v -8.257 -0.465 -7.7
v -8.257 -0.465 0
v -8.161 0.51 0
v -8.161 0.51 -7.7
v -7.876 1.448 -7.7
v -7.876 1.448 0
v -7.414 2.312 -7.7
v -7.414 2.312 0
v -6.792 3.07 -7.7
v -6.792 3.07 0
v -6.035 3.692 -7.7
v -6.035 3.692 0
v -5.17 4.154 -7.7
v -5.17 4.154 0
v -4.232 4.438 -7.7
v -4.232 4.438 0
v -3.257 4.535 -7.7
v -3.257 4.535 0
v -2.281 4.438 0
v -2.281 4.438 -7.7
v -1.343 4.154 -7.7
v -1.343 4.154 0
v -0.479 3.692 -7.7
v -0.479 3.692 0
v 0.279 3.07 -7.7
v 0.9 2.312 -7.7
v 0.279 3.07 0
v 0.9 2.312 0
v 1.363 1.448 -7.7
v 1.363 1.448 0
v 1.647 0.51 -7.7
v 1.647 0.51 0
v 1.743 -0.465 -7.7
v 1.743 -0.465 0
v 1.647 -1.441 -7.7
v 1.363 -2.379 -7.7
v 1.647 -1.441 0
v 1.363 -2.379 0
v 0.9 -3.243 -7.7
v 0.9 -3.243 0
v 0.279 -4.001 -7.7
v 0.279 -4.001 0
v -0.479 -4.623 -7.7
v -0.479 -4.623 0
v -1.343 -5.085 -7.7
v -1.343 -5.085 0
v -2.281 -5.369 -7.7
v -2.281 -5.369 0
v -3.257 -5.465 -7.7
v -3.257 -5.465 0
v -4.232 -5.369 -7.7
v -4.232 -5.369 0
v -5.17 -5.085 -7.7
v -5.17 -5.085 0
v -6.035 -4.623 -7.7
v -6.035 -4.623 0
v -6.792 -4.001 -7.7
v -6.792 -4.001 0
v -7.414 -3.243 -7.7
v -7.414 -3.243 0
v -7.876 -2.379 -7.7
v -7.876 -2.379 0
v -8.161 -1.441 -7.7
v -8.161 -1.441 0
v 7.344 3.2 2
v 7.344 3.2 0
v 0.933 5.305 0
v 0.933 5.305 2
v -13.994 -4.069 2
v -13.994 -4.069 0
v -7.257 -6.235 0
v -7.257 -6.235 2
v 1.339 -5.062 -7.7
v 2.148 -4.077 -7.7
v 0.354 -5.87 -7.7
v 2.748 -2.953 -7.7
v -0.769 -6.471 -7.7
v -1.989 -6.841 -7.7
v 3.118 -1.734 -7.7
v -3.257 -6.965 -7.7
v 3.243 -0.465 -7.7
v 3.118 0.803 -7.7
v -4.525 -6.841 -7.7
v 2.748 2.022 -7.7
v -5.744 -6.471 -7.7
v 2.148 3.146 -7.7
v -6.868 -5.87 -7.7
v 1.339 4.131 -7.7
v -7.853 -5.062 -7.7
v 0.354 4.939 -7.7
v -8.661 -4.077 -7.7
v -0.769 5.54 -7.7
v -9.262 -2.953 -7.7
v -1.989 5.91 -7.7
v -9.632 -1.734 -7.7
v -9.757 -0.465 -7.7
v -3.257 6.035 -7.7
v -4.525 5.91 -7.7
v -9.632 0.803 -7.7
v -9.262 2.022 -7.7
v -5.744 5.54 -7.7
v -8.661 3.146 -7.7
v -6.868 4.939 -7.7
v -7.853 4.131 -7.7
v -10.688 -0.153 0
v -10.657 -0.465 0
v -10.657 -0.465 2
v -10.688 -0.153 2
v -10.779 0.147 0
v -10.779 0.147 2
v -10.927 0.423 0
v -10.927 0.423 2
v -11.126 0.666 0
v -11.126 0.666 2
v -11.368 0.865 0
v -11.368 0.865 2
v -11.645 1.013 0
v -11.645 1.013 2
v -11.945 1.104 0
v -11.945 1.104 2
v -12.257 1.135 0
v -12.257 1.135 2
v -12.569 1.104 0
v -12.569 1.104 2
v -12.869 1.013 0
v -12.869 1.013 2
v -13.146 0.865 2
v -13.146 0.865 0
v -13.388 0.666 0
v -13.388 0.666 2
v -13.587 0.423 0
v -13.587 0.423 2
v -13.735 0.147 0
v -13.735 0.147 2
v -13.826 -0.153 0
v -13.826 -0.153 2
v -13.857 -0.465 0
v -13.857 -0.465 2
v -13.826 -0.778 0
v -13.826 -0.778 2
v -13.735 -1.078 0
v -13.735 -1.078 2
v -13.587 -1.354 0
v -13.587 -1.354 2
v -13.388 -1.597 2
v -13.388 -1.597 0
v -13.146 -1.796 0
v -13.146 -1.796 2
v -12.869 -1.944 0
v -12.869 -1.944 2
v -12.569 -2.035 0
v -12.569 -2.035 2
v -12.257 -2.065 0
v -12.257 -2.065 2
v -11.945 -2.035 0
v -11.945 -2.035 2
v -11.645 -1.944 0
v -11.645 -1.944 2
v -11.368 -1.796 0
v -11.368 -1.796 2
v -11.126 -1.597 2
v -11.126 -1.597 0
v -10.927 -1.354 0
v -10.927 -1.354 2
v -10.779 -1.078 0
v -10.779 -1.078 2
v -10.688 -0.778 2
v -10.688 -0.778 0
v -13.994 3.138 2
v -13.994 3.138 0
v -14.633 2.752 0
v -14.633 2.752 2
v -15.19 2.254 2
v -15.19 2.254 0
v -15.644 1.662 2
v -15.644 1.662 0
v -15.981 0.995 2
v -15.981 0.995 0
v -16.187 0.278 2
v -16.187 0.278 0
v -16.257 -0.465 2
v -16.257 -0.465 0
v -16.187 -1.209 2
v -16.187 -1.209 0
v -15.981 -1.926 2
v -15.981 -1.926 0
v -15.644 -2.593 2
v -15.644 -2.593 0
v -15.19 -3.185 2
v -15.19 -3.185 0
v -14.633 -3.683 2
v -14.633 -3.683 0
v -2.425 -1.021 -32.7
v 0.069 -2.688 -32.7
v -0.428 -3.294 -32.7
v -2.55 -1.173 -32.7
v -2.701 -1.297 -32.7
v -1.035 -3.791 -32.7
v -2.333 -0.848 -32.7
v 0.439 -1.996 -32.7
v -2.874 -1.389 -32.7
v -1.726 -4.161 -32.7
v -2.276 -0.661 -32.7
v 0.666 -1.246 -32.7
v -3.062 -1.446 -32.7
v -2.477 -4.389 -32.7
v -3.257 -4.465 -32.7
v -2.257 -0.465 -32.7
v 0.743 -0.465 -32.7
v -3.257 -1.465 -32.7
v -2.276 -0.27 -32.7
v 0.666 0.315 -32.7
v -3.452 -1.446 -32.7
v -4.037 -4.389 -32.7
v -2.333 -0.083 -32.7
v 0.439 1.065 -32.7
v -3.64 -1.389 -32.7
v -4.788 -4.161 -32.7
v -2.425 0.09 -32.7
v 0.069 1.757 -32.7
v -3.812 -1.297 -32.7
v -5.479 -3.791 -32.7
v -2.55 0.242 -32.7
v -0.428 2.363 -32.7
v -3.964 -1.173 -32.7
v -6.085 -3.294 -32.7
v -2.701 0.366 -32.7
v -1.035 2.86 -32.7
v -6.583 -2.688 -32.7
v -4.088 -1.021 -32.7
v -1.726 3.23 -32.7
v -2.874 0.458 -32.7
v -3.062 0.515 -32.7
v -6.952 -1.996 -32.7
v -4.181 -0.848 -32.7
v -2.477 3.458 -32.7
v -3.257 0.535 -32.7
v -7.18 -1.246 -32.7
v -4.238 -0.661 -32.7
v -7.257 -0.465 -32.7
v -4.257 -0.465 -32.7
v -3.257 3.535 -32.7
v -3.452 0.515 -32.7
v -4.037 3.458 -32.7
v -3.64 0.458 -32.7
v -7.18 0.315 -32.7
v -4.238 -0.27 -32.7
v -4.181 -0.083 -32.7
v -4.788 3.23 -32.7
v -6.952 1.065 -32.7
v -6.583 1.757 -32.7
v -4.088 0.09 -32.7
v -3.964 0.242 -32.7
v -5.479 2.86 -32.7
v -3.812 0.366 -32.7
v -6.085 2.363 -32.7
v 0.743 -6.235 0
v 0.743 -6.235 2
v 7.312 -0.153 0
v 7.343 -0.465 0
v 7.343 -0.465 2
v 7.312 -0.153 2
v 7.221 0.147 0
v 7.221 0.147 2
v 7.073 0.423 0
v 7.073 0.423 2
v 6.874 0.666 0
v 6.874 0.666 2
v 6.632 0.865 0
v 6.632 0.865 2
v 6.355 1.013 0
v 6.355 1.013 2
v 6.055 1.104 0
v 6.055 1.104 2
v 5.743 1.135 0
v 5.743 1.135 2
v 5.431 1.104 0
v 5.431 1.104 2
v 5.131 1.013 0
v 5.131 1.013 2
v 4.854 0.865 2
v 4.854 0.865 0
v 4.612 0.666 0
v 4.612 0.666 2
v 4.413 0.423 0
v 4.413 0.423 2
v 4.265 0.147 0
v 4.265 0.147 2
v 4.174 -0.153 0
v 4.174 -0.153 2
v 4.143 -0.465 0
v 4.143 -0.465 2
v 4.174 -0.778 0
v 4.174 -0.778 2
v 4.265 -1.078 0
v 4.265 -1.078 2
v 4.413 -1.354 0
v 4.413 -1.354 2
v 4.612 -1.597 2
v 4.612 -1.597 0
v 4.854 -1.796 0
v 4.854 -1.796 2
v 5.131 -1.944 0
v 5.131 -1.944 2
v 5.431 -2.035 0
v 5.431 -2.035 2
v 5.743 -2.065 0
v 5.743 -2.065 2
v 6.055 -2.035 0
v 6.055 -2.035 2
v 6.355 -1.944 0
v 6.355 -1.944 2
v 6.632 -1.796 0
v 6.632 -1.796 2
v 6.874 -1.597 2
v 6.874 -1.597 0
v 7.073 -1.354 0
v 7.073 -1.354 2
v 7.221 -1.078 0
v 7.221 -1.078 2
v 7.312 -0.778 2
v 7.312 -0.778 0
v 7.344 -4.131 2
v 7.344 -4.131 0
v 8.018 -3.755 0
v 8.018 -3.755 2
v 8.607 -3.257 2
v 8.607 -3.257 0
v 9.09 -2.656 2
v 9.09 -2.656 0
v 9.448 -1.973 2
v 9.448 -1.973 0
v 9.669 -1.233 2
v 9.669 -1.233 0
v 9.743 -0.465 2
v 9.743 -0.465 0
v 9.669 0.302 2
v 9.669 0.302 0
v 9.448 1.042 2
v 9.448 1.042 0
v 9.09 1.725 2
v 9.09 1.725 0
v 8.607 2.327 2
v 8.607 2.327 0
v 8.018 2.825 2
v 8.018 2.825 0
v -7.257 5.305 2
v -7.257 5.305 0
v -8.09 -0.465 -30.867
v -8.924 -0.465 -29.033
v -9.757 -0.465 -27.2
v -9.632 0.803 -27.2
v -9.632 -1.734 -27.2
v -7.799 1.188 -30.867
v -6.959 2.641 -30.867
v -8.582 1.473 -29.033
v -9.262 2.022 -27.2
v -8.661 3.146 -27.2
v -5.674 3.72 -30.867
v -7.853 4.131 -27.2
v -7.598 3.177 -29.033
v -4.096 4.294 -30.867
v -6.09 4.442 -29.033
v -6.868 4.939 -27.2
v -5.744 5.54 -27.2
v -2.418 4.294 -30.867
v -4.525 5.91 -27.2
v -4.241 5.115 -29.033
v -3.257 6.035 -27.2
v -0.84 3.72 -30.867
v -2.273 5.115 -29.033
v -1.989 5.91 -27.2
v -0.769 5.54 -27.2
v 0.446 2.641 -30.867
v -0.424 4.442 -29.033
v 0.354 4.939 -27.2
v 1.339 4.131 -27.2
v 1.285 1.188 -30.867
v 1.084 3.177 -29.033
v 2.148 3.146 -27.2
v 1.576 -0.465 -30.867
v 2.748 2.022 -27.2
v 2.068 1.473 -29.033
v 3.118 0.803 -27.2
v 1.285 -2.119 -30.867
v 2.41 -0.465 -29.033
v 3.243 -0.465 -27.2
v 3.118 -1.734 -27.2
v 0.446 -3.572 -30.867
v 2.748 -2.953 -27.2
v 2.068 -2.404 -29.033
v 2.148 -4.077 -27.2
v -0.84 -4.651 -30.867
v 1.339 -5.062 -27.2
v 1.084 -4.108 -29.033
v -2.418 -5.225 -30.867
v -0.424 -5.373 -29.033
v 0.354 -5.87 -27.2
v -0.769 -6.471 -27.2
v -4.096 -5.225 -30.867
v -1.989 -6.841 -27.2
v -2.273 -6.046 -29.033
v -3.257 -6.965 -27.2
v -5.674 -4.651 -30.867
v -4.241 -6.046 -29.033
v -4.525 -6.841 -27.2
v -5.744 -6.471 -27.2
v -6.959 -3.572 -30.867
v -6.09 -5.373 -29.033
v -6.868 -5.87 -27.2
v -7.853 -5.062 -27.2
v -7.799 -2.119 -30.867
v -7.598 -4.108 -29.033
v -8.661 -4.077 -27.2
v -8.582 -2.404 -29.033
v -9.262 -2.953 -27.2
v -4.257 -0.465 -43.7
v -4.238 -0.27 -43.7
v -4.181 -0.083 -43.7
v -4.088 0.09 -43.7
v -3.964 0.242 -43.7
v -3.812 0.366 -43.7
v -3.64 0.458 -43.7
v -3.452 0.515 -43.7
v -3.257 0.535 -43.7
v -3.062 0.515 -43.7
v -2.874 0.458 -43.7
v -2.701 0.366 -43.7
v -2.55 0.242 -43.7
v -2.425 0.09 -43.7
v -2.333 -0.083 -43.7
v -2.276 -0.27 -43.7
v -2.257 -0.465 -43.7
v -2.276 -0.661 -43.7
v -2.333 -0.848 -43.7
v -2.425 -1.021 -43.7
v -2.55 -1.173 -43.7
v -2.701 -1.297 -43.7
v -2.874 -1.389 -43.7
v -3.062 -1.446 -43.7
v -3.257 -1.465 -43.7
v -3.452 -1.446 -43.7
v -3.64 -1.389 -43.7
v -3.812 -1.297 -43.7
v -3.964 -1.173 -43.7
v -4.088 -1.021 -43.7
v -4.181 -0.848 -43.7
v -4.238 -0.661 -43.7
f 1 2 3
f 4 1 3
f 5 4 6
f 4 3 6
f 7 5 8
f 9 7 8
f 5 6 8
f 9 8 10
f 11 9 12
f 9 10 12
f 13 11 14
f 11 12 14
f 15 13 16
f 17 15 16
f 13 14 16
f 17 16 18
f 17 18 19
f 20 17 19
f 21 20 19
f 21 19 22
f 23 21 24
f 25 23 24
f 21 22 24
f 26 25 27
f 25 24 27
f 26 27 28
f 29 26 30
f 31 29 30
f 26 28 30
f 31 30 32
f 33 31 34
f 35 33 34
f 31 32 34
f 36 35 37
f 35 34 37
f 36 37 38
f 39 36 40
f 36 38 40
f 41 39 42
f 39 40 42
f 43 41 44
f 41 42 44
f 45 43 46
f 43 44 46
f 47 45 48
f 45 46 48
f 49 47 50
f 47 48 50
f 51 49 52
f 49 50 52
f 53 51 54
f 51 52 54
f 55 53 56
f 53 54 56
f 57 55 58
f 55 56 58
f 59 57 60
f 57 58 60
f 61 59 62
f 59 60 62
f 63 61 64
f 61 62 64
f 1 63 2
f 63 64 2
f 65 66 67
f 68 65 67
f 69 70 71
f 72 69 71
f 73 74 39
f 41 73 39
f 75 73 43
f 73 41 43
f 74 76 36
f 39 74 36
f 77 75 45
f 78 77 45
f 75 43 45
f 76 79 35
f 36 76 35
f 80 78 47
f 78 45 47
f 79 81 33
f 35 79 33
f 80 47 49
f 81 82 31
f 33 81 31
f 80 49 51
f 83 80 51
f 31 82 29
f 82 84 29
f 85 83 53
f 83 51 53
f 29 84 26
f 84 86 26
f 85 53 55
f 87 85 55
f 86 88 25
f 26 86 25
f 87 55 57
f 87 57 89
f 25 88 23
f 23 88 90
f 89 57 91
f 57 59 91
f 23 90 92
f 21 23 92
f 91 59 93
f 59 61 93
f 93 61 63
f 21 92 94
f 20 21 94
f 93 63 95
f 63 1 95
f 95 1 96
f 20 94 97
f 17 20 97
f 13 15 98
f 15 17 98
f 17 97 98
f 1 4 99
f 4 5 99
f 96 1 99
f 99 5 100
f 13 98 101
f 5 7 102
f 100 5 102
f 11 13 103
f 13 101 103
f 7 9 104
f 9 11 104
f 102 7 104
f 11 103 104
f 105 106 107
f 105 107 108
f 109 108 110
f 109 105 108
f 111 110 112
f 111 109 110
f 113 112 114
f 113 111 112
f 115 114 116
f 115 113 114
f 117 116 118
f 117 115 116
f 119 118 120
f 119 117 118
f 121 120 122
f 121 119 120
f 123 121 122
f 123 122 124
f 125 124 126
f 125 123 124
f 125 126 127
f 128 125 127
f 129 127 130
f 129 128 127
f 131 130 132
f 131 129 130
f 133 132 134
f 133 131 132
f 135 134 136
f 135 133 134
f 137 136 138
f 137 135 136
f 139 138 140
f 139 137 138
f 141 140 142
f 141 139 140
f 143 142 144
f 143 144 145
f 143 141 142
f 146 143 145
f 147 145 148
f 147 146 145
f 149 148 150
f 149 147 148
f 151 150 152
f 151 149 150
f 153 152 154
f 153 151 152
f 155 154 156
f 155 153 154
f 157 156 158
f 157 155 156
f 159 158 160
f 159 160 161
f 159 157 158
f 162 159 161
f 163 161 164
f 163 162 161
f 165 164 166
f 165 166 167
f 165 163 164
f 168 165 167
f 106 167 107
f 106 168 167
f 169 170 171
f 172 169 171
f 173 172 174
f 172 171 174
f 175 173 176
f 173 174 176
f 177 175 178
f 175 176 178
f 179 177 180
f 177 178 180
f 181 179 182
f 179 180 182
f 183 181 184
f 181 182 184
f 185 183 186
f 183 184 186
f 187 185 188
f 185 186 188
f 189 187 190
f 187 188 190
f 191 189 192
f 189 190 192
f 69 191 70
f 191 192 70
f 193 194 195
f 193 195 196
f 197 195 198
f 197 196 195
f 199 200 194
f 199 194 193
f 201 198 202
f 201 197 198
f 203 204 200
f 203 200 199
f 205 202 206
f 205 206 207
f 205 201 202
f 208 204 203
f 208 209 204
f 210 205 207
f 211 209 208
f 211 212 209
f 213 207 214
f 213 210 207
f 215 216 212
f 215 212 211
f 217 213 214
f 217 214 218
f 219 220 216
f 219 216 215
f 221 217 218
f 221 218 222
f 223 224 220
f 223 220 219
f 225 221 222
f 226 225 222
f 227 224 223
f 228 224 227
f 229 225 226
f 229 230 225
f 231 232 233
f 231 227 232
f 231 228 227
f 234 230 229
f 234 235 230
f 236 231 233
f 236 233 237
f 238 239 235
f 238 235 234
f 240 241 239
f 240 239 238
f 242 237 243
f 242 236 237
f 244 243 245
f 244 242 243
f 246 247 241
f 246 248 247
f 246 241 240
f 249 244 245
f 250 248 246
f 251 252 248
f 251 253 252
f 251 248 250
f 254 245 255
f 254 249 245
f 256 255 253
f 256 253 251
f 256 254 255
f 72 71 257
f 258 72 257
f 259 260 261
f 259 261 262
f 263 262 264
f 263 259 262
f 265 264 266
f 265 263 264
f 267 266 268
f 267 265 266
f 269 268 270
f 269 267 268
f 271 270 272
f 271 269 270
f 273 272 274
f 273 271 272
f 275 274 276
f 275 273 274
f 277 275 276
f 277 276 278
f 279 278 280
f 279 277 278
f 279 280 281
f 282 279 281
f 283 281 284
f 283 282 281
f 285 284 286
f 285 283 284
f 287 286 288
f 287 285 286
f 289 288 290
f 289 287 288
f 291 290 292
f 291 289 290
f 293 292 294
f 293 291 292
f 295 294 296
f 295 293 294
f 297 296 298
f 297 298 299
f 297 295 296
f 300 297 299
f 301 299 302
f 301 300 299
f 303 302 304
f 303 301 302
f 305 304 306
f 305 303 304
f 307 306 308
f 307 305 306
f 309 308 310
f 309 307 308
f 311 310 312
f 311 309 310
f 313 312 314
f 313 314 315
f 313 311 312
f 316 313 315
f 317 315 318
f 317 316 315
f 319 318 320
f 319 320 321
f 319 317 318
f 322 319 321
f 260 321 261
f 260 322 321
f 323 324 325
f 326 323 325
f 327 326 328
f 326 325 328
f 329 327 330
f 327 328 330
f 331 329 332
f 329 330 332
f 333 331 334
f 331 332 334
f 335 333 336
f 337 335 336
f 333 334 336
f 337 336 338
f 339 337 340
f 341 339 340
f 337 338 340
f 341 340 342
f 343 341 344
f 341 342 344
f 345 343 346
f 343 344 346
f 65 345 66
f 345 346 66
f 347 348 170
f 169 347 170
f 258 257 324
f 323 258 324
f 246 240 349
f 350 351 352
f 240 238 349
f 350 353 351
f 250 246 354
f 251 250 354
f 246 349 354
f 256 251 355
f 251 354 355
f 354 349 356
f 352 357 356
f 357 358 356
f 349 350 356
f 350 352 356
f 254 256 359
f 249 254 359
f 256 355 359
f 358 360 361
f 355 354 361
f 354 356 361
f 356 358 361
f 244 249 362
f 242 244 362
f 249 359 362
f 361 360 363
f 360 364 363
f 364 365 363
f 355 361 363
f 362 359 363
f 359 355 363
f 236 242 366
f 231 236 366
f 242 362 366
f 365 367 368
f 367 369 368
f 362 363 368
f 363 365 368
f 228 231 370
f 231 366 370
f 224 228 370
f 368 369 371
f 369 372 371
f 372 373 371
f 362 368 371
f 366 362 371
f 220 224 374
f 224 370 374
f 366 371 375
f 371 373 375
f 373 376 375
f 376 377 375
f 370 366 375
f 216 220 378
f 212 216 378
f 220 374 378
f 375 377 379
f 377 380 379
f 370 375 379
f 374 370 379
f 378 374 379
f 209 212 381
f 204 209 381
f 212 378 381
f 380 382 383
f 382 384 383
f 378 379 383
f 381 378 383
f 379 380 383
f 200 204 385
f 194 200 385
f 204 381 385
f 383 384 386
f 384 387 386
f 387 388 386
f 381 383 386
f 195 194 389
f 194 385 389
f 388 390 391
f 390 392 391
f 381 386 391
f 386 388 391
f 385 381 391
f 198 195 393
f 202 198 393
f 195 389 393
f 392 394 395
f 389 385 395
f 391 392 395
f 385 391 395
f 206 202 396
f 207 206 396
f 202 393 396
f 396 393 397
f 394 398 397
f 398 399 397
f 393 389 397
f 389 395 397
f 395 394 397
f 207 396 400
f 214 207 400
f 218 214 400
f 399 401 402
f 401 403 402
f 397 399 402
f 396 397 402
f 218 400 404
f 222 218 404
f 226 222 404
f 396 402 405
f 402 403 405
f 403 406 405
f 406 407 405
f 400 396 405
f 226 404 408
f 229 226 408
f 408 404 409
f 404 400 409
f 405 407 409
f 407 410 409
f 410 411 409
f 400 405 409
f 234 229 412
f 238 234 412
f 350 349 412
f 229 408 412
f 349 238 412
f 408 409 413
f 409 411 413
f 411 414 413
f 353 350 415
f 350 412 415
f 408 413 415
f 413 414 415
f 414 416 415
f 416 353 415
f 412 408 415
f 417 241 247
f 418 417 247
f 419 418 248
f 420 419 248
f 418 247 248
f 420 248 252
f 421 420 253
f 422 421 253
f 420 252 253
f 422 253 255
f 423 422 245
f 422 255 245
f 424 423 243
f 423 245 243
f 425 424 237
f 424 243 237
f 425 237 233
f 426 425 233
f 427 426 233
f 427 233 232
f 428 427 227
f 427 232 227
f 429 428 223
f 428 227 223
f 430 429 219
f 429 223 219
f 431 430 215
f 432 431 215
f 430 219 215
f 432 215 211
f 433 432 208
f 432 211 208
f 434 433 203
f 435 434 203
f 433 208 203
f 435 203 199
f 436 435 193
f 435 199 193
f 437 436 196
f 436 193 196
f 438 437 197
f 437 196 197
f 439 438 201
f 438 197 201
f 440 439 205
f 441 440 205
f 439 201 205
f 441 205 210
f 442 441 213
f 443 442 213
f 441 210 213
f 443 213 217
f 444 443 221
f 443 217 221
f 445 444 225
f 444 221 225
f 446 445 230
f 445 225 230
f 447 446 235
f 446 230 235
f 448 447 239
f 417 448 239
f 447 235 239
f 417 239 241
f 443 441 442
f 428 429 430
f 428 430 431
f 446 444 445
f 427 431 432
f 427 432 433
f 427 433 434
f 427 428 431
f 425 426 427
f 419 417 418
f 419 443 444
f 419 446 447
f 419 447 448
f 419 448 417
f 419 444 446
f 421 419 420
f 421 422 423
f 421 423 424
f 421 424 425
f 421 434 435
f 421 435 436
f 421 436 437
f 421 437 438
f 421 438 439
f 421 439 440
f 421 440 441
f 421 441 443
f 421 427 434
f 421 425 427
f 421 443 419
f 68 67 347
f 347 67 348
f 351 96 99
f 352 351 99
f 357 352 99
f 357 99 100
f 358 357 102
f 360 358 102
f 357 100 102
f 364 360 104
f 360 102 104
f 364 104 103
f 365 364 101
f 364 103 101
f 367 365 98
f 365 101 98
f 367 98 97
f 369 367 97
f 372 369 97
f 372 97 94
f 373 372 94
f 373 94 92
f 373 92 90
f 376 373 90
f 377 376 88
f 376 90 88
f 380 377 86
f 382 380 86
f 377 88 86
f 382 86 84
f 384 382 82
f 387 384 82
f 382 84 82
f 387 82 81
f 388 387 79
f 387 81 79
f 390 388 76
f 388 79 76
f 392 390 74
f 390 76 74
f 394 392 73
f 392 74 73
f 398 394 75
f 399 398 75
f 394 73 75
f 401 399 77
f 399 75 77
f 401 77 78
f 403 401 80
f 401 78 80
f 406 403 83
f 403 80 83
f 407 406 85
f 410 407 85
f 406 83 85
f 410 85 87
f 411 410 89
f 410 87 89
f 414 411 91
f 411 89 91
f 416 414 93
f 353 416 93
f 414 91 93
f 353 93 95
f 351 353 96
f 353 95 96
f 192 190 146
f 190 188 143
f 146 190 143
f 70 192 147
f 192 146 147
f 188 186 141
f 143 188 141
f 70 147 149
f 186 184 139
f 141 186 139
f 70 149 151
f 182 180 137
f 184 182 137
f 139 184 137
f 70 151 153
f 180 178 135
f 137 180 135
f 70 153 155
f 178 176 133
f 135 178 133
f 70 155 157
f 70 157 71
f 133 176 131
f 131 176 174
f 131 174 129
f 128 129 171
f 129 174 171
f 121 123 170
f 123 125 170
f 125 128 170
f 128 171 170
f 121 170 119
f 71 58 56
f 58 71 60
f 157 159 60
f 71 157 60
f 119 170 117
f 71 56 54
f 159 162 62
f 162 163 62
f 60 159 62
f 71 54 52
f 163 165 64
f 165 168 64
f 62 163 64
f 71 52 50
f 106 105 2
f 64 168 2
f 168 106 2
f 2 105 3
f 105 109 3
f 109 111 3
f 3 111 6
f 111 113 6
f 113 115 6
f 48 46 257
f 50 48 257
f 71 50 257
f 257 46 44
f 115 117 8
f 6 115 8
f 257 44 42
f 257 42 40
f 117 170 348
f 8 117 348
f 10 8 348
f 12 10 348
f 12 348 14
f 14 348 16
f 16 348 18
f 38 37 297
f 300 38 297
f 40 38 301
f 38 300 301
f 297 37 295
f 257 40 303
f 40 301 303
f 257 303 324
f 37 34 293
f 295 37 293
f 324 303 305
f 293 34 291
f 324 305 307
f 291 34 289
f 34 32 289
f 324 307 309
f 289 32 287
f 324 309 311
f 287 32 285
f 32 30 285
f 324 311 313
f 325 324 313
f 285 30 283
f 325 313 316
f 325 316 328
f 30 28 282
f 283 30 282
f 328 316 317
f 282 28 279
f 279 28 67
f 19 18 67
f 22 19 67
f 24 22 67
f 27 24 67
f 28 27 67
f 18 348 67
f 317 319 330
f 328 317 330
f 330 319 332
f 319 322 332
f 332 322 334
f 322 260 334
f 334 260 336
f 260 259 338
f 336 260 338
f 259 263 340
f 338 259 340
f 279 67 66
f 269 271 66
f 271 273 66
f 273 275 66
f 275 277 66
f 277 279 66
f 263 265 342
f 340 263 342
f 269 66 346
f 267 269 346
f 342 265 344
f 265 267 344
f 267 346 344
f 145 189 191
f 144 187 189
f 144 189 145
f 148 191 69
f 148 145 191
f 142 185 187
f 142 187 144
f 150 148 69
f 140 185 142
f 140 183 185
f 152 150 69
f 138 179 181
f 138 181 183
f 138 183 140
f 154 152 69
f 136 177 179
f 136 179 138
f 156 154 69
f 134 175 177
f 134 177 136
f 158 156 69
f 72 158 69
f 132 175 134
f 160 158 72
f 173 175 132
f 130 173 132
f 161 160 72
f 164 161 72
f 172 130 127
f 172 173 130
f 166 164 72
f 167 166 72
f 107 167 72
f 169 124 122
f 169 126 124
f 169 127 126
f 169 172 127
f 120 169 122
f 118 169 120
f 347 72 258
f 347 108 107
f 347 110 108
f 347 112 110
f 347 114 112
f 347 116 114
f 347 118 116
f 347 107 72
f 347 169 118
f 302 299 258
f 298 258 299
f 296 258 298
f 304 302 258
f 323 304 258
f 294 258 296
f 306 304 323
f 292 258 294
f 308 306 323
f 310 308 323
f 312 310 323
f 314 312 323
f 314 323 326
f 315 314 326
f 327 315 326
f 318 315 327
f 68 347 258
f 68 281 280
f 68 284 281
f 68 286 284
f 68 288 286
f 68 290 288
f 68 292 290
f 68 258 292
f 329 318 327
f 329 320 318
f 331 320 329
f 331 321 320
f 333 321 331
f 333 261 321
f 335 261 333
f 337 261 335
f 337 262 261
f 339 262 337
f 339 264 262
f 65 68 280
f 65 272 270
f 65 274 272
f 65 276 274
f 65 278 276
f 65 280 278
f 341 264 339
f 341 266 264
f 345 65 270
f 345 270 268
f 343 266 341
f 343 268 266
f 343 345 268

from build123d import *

# Parameters (mm, degrees)
SKETCH_1_R      = 1.6
EXTRUDE_1_DEPTH = 2
SKETCH_2_R      = 5
EXTRUDE_2_DEPTH = 7.7
SKETCH_3_R      = 6.5
SKETCH_3_R_2    = 5
EXTRUDE_3_DEPTH = 19.5
SKETCH_4_R      = 4
SKETCH_5_R      = 1
EXTRUDE_4_DEPTH = 11


with BuildPart() as part:
    # 草图1 → 凸台-拉伸1 (new body)
    with BuildSketch(Plane.XY):
        with BuildLine():
            Line((0.933236487, 5.304565516), (-7.256880734, 5.304565516))
            Line((-7.256880734, 5.304565516), (-13.994027653, 3.137664263))
            ThreePointArc((-13.994027653, 3.137664263), (-16.256880734, -0.465434484), (-13.994027653, -4.068533231))
            Line((-13.994027653, -4.068533231), (-7.256880734, -6.235434484))
            Line((-7.256880734, -6.235434484), (0.743119266, -6.235434484))
            Line((0.743119266, -6.235434484), (7.344389981, -4.130940192))
            ThreePointArc((7.344389981, -4.130940192), (9.743119266, -0.465434484), (7.344389981, 3.200071224))
            Line((7.344389981, 3.200071224), (0.933236487, 5.304565516))
        make_face()
        with Locations((-12.256880734, -0.465434484)):
            Circle(SKETCH_1_R, mode=Mode.SUBTRACT)
        with Locations((5.743119266, -0.465434484)):
            Circle(SKETCH_1_R, mode=Mode.SUBTRACT)
    extrude(amount=EXTRUDE_1_DEPTH)

    # 草图2 → 凸台-拉伸2 (add)
    with BuildSketch(Plane(origin=(0, 0, 0), x_dir=(-1, 0, 0), z_dir=(0, 0, -1))):
        with Locations((3.256880734, -0.465434484)):
            Circle(SKETCH_2_R)
    extrude(amount=EXTRUDE_2_DEPTH)

    # 草图3 → 凸台-拉伸3 (add)
    with BuildSketch(Plane(origin=(0, 0, -7.7), x_dir=(-1, 0, 0), z_dir=(0, 0, -1))):
        with Locations((3.256880734, -0.465434484)):
            Circle(SKETCH_3_R)
        with Locations((3.256880734, -0.465434484)):
            Circle(SKETCH_3_R_2, mode=Mode.SUBTRACT)
        with BuildLine():
            ThreePointArc((-1.743119266, -0.465434484), (3.256880734, -5.465434484), (8.256880734, -0.465434484))
            Line((8.256880734, -0.465434484), (-1.743119266, -0.465434484))
        make_face()
        with BuildLine():
            Line((-1.743119266, -0.465434484), (8.256880734, -0.465434484))
            ThreePointArc((8.256880734, -0.465434484), (3.256880734, 4.534565516), (-1.743119266, -0.465434484))
        make_face()
    extrude(amount=EXTRUDE_3_DEPTH)

    # 草图4 → section 0 of loft_1
    with BuildSketch(Plane(origin=(0, 0, -32.7), x_dir=(-1, 0, 0), z_dir=(0, 0, -1)), mode=Mode.PRIVATE) as loft_1_s0:
        with Locations((3.256880734, -0.465434484)):
            Circle(SKETCH_4_R)
    # loft up to a face of the part (loft_1)
    loft([loft_1_s0.sketch, part.faces().sort_by_distance((-3.256880734, -0.465434484, -27.2))[0]])

    # 草图5 → 凸台-拉伸4 (add)
    with BuildSketch(Plane(origin=(0, 0, -32.7), x_dir=(-1, 0, 0), z_dir=(0, 0, -1))):
        with Locations((3.256880734, -0.465434484)):
            Circle(SKETCH_5_R)
    extrude(amount=EXTRUDE_4_DEPTH)


solid = part.part
